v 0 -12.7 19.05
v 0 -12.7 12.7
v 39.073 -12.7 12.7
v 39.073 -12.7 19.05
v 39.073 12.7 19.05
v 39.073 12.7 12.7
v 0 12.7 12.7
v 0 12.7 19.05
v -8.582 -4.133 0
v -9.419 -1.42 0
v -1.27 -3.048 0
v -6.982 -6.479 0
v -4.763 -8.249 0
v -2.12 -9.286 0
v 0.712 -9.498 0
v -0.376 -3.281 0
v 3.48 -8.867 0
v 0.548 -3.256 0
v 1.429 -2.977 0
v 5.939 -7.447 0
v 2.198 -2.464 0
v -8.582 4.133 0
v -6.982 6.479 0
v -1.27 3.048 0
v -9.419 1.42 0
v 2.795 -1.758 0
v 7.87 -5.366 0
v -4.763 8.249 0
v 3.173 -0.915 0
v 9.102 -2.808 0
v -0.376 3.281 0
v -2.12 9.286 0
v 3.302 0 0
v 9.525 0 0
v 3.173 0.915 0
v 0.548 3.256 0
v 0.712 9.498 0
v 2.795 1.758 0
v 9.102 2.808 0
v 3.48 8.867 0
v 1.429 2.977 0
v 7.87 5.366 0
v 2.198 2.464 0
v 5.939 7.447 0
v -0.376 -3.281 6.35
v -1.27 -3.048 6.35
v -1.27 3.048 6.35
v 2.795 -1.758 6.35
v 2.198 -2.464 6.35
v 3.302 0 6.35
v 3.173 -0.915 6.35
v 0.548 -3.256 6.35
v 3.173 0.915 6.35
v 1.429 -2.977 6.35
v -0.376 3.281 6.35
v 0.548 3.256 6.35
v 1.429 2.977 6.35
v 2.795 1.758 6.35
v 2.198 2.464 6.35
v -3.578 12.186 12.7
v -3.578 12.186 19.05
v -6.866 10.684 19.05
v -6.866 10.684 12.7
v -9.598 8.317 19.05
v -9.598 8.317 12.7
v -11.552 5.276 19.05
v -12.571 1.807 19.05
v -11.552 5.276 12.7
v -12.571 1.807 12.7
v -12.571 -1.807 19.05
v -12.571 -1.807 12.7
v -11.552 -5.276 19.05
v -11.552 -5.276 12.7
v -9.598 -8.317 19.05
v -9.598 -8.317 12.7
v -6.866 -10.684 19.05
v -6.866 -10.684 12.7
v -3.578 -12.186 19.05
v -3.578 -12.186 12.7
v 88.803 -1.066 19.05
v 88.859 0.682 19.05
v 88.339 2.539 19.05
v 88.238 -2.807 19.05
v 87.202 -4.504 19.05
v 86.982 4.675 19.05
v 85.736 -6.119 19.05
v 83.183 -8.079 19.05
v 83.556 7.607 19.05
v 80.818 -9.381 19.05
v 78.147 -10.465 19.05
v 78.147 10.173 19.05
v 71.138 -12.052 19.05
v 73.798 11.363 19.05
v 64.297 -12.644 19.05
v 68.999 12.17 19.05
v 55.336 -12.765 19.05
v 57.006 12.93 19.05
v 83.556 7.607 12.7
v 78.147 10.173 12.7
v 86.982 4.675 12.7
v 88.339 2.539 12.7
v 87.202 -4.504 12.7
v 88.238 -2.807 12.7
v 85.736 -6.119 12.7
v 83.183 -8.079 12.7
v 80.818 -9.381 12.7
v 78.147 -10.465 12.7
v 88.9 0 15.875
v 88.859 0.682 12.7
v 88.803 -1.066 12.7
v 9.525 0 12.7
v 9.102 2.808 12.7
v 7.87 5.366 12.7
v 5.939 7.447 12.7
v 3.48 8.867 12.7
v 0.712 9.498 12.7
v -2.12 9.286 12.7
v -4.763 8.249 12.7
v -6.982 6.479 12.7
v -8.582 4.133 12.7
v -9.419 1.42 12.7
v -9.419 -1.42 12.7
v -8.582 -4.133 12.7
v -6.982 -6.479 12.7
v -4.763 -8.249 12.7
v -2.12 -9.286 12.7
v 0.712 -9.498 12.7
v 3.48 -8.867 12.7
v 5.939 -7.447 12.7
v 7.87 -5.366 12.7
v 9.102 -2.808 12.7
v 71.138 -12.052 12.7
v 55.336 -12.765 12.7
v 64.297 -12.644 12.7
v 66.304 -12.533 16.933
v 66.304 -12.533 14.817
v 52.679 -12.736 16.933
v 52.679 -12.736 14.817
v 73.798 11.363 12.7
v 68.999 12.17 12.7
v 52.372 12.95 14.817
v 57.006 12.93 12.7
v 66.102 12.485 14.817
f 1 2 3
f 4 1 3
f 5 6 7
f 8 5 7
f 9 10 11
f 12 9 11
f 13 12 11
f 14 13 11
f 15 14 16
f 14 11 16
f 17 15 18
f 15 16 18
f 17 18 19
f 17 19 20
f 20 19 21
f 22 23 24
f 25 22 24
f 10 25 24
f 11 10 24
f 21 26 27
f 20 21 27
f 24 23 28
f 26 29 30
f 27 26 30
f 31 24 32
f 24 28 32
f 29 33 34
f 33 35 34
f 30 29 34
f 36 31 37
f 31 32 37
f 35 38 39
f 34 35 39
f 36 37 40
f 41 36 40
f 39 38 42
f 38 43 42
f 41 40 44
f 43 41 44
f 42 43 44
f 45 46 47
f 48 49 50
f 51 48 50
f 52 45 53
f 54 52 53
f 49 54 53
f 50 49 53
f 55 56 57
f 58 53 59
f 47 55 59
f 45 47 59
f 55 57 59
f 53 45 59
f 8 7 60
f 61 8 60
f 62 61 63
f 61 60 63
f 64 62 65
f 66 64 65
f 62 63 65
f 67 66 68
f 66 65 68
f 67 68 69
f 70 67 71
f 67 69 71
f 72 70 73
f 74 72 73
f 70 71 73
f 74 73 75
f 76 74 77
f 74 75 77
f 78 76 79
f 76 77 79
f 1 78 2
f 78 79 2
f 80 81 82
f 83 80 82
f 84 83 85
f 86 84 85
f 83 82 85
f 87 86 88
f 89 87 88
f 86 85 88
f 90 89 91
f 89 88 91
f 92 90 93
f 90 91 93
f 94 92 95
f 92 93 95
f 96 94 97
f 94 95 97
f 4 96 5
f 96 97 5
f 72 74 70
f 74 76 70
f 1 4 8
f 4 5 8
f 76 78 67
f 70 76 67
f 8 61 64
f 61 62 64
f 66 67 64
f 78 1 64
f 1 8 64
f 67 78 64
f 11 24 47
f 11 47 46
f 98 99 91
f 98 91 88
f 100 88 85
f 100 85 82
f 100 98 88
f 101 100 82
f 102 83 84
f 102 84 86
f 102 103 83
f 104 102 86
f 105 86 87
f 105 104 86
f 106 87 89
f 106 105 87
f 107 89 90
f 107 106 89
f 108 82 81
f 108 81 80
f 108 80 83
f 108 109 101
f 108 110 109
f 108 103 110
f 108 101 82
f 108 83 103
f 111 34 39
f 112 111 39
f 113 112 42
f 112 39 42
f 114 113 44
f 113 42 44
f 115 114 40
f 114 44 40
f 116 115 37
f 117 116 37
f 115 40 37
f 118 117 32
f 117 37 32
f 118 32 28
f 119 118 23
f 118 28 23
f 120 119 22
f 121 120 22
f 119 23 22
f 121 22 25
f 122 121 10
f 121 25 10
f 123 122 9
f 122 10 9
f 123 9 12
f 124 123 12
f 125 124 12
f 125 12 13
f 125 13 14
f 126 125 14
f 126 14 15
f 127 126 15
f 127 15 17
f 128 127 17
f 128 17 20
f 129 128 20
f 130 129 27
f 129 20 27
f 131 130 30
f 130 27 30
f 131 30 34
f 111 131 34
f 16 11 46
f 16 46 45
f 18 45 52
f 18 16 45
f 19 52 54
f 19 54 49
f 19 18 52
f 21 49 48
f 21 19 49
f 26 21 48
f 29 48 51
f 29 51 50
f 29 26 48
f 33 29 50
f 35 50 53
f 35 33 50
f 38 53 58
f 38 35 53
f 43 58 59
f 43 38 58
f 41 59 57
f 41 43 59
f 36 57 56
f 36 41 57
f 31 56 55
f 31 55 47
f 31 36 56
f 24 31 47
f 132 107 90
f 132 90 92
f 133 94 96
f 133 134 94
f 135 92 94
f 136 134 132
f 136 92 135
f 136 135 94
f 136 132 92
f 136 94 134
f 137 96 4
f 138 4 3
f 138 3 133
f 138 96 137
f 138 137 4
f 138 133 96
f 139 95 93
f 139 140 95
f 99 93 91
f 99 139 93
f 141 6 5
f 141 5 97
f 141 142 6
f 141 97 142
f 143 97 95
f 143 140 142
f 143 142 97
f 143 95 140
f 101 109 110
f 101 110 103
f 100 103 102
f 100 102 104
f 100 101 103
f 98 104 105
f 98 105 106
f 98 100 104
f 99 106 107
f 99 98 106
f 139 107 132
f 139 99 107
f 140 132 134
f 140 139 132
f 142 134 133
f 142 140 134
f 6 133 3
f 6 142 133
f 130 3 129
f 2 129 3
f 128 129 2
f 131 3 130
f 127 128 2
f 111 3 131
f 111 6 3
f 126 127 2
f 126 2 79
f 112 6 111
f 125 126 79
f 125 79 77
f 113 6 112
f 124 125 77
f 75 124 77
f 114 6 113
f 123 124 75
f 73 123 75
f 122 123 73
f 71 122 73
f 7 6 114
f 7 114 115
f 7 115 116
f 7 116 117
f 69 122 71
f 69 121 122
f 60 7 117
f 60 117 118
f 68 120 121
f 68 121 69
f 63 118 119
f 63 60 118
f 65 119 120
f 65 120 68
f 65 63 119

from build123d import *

# Parameters (mm, degrees)
F1_R     = 9.525
F2_DEPTH = 12.7
F3_DEPTH = 6.35
F5_DEPTH = 6.35


with BuildPart() as f2:
    # F1 (on Top) → F2 (new body)
    with BuildSketch(Plane.XY):
        Circle(F1_R)
    extrude(amount=F2_DEPTH)

    # F0 (on Top) → F3 (cut)
    with BuildSketch(Plane.XY):
        with BuildLine():
            Line((-1.27, 3.048), (-1.27, -3.048))
            ThreePointArc((-1.27, -3.048), (3.302, 0), (-1.27, 3.048))
        make_face()
    extrude(amount=F3_DEPTH, mode=Mode.SUBTRACT)

    # F4 (on face) → F5 (join)
    with BuildSketch(Plane.XY.offset(12.7)):
        with BuildLine():
            add(Edge.make_bspline(
                [(78.1465370953, 10.1726271266), (84.5997905756, 7.9514466281), (93.2222153183, 0.1048863469), (84.5556786618, -8.2715012229), (78.1465370953, -10.4653070771)],
                knots=[0.309244335, 0.309244335, 0.309244335, 0.309244335, 0.4993866301, 0.6908259731, 0.6908259731, 0.6908259731, 0.6908259731], degree=3))
            Line((78.1465370953, 10.1726271266), (78.1465370953, -10.4653070771))
        make_face()
        with BuildLine():
            ThreePointArc((0, 12.7), (8.9802561211, 8.9802561211), (12.7, 0))
            ThreePointArc((12.7, 0), (8.9802561211, -8.9802561211), (0, -12.7))
            Line((0, -12.7), (39.0732685476, -12.7))
            add(Edge.make_bspline(
                [(78.1465370953, -10.4653070771), (67.795790613, -14.0082976621), (52.0691349766, -12.3123618235), (39.0732685476, -12.7)],
                knots=[0.6908259731, 0.6908259731, 0.6908259731, 0.6908259731, 1, 1, 1, 1], degree=3))
            Line((78.1465370953, -10.4653070771), (78.1465370953, 10.1726271266))
            add(Edge.make_bspline(
                [(39.0732685476, 12.7), (51.4508770451, 12.9306208488), (67.6510706324, 13.7851189498), (78.1465370953, 10.1726271266)],
                knots=[0, 0, 0, 0, 0.309244335, 0.309244335, 0.309244335, 0.309244335], degree=3))
            Line((39.0732685476, 12.7), (0, 12.7))
        make_face()
        with BuildLine():
            Line((0, 9.525), (0, 12.7))
            ThreePointArc((0, 12.7), (-12.7, 0), (0, -12.7))
            Line((0, -12.7), (0, -9.525))
            ThreePointArc((0, -9.525), (-9.525, 0), (0, 9.525))
        make_face()
        with BuildLine():
            ThreePointArc((0, -12.7), (8.9802561211, -8.9802561211), (12.7, 0))
            ThreePointArc((12.7, 0), (8.9802561211, 8.9802561211), (0, 12.7))
            Line((0, 12.7), (0, 9.525))
            ThreePointArc((0, 9.525), (6.7351920908, 6.7351920908), (9.525, 0))
            ThreePointArc((9.525, 0), (6.7351920908, -6.7351920908), (0, -9.525))
            Line((0, -9.525), (0, -12.7))
        make_face()
        with BuildLine():
            ThreePointArc((9.525, 0), (6.7351920908, 6.7351920908), (0, 9.525))
            Line((0, 9.525), (0, -9.525))
            ThreePointArc((0, -9.525), (6.7351920908, -6.7351920908), (9.525, 0))
        make_face()
        with BuildLine():
            Line((0, -9.525), (0, 9.525))
            ThreePointArc((0, 9.525), (-9.525, 0), (0, -9.525))
        make_face()
    extrude(amount=F5_DEPTH)


solid = f2.part
